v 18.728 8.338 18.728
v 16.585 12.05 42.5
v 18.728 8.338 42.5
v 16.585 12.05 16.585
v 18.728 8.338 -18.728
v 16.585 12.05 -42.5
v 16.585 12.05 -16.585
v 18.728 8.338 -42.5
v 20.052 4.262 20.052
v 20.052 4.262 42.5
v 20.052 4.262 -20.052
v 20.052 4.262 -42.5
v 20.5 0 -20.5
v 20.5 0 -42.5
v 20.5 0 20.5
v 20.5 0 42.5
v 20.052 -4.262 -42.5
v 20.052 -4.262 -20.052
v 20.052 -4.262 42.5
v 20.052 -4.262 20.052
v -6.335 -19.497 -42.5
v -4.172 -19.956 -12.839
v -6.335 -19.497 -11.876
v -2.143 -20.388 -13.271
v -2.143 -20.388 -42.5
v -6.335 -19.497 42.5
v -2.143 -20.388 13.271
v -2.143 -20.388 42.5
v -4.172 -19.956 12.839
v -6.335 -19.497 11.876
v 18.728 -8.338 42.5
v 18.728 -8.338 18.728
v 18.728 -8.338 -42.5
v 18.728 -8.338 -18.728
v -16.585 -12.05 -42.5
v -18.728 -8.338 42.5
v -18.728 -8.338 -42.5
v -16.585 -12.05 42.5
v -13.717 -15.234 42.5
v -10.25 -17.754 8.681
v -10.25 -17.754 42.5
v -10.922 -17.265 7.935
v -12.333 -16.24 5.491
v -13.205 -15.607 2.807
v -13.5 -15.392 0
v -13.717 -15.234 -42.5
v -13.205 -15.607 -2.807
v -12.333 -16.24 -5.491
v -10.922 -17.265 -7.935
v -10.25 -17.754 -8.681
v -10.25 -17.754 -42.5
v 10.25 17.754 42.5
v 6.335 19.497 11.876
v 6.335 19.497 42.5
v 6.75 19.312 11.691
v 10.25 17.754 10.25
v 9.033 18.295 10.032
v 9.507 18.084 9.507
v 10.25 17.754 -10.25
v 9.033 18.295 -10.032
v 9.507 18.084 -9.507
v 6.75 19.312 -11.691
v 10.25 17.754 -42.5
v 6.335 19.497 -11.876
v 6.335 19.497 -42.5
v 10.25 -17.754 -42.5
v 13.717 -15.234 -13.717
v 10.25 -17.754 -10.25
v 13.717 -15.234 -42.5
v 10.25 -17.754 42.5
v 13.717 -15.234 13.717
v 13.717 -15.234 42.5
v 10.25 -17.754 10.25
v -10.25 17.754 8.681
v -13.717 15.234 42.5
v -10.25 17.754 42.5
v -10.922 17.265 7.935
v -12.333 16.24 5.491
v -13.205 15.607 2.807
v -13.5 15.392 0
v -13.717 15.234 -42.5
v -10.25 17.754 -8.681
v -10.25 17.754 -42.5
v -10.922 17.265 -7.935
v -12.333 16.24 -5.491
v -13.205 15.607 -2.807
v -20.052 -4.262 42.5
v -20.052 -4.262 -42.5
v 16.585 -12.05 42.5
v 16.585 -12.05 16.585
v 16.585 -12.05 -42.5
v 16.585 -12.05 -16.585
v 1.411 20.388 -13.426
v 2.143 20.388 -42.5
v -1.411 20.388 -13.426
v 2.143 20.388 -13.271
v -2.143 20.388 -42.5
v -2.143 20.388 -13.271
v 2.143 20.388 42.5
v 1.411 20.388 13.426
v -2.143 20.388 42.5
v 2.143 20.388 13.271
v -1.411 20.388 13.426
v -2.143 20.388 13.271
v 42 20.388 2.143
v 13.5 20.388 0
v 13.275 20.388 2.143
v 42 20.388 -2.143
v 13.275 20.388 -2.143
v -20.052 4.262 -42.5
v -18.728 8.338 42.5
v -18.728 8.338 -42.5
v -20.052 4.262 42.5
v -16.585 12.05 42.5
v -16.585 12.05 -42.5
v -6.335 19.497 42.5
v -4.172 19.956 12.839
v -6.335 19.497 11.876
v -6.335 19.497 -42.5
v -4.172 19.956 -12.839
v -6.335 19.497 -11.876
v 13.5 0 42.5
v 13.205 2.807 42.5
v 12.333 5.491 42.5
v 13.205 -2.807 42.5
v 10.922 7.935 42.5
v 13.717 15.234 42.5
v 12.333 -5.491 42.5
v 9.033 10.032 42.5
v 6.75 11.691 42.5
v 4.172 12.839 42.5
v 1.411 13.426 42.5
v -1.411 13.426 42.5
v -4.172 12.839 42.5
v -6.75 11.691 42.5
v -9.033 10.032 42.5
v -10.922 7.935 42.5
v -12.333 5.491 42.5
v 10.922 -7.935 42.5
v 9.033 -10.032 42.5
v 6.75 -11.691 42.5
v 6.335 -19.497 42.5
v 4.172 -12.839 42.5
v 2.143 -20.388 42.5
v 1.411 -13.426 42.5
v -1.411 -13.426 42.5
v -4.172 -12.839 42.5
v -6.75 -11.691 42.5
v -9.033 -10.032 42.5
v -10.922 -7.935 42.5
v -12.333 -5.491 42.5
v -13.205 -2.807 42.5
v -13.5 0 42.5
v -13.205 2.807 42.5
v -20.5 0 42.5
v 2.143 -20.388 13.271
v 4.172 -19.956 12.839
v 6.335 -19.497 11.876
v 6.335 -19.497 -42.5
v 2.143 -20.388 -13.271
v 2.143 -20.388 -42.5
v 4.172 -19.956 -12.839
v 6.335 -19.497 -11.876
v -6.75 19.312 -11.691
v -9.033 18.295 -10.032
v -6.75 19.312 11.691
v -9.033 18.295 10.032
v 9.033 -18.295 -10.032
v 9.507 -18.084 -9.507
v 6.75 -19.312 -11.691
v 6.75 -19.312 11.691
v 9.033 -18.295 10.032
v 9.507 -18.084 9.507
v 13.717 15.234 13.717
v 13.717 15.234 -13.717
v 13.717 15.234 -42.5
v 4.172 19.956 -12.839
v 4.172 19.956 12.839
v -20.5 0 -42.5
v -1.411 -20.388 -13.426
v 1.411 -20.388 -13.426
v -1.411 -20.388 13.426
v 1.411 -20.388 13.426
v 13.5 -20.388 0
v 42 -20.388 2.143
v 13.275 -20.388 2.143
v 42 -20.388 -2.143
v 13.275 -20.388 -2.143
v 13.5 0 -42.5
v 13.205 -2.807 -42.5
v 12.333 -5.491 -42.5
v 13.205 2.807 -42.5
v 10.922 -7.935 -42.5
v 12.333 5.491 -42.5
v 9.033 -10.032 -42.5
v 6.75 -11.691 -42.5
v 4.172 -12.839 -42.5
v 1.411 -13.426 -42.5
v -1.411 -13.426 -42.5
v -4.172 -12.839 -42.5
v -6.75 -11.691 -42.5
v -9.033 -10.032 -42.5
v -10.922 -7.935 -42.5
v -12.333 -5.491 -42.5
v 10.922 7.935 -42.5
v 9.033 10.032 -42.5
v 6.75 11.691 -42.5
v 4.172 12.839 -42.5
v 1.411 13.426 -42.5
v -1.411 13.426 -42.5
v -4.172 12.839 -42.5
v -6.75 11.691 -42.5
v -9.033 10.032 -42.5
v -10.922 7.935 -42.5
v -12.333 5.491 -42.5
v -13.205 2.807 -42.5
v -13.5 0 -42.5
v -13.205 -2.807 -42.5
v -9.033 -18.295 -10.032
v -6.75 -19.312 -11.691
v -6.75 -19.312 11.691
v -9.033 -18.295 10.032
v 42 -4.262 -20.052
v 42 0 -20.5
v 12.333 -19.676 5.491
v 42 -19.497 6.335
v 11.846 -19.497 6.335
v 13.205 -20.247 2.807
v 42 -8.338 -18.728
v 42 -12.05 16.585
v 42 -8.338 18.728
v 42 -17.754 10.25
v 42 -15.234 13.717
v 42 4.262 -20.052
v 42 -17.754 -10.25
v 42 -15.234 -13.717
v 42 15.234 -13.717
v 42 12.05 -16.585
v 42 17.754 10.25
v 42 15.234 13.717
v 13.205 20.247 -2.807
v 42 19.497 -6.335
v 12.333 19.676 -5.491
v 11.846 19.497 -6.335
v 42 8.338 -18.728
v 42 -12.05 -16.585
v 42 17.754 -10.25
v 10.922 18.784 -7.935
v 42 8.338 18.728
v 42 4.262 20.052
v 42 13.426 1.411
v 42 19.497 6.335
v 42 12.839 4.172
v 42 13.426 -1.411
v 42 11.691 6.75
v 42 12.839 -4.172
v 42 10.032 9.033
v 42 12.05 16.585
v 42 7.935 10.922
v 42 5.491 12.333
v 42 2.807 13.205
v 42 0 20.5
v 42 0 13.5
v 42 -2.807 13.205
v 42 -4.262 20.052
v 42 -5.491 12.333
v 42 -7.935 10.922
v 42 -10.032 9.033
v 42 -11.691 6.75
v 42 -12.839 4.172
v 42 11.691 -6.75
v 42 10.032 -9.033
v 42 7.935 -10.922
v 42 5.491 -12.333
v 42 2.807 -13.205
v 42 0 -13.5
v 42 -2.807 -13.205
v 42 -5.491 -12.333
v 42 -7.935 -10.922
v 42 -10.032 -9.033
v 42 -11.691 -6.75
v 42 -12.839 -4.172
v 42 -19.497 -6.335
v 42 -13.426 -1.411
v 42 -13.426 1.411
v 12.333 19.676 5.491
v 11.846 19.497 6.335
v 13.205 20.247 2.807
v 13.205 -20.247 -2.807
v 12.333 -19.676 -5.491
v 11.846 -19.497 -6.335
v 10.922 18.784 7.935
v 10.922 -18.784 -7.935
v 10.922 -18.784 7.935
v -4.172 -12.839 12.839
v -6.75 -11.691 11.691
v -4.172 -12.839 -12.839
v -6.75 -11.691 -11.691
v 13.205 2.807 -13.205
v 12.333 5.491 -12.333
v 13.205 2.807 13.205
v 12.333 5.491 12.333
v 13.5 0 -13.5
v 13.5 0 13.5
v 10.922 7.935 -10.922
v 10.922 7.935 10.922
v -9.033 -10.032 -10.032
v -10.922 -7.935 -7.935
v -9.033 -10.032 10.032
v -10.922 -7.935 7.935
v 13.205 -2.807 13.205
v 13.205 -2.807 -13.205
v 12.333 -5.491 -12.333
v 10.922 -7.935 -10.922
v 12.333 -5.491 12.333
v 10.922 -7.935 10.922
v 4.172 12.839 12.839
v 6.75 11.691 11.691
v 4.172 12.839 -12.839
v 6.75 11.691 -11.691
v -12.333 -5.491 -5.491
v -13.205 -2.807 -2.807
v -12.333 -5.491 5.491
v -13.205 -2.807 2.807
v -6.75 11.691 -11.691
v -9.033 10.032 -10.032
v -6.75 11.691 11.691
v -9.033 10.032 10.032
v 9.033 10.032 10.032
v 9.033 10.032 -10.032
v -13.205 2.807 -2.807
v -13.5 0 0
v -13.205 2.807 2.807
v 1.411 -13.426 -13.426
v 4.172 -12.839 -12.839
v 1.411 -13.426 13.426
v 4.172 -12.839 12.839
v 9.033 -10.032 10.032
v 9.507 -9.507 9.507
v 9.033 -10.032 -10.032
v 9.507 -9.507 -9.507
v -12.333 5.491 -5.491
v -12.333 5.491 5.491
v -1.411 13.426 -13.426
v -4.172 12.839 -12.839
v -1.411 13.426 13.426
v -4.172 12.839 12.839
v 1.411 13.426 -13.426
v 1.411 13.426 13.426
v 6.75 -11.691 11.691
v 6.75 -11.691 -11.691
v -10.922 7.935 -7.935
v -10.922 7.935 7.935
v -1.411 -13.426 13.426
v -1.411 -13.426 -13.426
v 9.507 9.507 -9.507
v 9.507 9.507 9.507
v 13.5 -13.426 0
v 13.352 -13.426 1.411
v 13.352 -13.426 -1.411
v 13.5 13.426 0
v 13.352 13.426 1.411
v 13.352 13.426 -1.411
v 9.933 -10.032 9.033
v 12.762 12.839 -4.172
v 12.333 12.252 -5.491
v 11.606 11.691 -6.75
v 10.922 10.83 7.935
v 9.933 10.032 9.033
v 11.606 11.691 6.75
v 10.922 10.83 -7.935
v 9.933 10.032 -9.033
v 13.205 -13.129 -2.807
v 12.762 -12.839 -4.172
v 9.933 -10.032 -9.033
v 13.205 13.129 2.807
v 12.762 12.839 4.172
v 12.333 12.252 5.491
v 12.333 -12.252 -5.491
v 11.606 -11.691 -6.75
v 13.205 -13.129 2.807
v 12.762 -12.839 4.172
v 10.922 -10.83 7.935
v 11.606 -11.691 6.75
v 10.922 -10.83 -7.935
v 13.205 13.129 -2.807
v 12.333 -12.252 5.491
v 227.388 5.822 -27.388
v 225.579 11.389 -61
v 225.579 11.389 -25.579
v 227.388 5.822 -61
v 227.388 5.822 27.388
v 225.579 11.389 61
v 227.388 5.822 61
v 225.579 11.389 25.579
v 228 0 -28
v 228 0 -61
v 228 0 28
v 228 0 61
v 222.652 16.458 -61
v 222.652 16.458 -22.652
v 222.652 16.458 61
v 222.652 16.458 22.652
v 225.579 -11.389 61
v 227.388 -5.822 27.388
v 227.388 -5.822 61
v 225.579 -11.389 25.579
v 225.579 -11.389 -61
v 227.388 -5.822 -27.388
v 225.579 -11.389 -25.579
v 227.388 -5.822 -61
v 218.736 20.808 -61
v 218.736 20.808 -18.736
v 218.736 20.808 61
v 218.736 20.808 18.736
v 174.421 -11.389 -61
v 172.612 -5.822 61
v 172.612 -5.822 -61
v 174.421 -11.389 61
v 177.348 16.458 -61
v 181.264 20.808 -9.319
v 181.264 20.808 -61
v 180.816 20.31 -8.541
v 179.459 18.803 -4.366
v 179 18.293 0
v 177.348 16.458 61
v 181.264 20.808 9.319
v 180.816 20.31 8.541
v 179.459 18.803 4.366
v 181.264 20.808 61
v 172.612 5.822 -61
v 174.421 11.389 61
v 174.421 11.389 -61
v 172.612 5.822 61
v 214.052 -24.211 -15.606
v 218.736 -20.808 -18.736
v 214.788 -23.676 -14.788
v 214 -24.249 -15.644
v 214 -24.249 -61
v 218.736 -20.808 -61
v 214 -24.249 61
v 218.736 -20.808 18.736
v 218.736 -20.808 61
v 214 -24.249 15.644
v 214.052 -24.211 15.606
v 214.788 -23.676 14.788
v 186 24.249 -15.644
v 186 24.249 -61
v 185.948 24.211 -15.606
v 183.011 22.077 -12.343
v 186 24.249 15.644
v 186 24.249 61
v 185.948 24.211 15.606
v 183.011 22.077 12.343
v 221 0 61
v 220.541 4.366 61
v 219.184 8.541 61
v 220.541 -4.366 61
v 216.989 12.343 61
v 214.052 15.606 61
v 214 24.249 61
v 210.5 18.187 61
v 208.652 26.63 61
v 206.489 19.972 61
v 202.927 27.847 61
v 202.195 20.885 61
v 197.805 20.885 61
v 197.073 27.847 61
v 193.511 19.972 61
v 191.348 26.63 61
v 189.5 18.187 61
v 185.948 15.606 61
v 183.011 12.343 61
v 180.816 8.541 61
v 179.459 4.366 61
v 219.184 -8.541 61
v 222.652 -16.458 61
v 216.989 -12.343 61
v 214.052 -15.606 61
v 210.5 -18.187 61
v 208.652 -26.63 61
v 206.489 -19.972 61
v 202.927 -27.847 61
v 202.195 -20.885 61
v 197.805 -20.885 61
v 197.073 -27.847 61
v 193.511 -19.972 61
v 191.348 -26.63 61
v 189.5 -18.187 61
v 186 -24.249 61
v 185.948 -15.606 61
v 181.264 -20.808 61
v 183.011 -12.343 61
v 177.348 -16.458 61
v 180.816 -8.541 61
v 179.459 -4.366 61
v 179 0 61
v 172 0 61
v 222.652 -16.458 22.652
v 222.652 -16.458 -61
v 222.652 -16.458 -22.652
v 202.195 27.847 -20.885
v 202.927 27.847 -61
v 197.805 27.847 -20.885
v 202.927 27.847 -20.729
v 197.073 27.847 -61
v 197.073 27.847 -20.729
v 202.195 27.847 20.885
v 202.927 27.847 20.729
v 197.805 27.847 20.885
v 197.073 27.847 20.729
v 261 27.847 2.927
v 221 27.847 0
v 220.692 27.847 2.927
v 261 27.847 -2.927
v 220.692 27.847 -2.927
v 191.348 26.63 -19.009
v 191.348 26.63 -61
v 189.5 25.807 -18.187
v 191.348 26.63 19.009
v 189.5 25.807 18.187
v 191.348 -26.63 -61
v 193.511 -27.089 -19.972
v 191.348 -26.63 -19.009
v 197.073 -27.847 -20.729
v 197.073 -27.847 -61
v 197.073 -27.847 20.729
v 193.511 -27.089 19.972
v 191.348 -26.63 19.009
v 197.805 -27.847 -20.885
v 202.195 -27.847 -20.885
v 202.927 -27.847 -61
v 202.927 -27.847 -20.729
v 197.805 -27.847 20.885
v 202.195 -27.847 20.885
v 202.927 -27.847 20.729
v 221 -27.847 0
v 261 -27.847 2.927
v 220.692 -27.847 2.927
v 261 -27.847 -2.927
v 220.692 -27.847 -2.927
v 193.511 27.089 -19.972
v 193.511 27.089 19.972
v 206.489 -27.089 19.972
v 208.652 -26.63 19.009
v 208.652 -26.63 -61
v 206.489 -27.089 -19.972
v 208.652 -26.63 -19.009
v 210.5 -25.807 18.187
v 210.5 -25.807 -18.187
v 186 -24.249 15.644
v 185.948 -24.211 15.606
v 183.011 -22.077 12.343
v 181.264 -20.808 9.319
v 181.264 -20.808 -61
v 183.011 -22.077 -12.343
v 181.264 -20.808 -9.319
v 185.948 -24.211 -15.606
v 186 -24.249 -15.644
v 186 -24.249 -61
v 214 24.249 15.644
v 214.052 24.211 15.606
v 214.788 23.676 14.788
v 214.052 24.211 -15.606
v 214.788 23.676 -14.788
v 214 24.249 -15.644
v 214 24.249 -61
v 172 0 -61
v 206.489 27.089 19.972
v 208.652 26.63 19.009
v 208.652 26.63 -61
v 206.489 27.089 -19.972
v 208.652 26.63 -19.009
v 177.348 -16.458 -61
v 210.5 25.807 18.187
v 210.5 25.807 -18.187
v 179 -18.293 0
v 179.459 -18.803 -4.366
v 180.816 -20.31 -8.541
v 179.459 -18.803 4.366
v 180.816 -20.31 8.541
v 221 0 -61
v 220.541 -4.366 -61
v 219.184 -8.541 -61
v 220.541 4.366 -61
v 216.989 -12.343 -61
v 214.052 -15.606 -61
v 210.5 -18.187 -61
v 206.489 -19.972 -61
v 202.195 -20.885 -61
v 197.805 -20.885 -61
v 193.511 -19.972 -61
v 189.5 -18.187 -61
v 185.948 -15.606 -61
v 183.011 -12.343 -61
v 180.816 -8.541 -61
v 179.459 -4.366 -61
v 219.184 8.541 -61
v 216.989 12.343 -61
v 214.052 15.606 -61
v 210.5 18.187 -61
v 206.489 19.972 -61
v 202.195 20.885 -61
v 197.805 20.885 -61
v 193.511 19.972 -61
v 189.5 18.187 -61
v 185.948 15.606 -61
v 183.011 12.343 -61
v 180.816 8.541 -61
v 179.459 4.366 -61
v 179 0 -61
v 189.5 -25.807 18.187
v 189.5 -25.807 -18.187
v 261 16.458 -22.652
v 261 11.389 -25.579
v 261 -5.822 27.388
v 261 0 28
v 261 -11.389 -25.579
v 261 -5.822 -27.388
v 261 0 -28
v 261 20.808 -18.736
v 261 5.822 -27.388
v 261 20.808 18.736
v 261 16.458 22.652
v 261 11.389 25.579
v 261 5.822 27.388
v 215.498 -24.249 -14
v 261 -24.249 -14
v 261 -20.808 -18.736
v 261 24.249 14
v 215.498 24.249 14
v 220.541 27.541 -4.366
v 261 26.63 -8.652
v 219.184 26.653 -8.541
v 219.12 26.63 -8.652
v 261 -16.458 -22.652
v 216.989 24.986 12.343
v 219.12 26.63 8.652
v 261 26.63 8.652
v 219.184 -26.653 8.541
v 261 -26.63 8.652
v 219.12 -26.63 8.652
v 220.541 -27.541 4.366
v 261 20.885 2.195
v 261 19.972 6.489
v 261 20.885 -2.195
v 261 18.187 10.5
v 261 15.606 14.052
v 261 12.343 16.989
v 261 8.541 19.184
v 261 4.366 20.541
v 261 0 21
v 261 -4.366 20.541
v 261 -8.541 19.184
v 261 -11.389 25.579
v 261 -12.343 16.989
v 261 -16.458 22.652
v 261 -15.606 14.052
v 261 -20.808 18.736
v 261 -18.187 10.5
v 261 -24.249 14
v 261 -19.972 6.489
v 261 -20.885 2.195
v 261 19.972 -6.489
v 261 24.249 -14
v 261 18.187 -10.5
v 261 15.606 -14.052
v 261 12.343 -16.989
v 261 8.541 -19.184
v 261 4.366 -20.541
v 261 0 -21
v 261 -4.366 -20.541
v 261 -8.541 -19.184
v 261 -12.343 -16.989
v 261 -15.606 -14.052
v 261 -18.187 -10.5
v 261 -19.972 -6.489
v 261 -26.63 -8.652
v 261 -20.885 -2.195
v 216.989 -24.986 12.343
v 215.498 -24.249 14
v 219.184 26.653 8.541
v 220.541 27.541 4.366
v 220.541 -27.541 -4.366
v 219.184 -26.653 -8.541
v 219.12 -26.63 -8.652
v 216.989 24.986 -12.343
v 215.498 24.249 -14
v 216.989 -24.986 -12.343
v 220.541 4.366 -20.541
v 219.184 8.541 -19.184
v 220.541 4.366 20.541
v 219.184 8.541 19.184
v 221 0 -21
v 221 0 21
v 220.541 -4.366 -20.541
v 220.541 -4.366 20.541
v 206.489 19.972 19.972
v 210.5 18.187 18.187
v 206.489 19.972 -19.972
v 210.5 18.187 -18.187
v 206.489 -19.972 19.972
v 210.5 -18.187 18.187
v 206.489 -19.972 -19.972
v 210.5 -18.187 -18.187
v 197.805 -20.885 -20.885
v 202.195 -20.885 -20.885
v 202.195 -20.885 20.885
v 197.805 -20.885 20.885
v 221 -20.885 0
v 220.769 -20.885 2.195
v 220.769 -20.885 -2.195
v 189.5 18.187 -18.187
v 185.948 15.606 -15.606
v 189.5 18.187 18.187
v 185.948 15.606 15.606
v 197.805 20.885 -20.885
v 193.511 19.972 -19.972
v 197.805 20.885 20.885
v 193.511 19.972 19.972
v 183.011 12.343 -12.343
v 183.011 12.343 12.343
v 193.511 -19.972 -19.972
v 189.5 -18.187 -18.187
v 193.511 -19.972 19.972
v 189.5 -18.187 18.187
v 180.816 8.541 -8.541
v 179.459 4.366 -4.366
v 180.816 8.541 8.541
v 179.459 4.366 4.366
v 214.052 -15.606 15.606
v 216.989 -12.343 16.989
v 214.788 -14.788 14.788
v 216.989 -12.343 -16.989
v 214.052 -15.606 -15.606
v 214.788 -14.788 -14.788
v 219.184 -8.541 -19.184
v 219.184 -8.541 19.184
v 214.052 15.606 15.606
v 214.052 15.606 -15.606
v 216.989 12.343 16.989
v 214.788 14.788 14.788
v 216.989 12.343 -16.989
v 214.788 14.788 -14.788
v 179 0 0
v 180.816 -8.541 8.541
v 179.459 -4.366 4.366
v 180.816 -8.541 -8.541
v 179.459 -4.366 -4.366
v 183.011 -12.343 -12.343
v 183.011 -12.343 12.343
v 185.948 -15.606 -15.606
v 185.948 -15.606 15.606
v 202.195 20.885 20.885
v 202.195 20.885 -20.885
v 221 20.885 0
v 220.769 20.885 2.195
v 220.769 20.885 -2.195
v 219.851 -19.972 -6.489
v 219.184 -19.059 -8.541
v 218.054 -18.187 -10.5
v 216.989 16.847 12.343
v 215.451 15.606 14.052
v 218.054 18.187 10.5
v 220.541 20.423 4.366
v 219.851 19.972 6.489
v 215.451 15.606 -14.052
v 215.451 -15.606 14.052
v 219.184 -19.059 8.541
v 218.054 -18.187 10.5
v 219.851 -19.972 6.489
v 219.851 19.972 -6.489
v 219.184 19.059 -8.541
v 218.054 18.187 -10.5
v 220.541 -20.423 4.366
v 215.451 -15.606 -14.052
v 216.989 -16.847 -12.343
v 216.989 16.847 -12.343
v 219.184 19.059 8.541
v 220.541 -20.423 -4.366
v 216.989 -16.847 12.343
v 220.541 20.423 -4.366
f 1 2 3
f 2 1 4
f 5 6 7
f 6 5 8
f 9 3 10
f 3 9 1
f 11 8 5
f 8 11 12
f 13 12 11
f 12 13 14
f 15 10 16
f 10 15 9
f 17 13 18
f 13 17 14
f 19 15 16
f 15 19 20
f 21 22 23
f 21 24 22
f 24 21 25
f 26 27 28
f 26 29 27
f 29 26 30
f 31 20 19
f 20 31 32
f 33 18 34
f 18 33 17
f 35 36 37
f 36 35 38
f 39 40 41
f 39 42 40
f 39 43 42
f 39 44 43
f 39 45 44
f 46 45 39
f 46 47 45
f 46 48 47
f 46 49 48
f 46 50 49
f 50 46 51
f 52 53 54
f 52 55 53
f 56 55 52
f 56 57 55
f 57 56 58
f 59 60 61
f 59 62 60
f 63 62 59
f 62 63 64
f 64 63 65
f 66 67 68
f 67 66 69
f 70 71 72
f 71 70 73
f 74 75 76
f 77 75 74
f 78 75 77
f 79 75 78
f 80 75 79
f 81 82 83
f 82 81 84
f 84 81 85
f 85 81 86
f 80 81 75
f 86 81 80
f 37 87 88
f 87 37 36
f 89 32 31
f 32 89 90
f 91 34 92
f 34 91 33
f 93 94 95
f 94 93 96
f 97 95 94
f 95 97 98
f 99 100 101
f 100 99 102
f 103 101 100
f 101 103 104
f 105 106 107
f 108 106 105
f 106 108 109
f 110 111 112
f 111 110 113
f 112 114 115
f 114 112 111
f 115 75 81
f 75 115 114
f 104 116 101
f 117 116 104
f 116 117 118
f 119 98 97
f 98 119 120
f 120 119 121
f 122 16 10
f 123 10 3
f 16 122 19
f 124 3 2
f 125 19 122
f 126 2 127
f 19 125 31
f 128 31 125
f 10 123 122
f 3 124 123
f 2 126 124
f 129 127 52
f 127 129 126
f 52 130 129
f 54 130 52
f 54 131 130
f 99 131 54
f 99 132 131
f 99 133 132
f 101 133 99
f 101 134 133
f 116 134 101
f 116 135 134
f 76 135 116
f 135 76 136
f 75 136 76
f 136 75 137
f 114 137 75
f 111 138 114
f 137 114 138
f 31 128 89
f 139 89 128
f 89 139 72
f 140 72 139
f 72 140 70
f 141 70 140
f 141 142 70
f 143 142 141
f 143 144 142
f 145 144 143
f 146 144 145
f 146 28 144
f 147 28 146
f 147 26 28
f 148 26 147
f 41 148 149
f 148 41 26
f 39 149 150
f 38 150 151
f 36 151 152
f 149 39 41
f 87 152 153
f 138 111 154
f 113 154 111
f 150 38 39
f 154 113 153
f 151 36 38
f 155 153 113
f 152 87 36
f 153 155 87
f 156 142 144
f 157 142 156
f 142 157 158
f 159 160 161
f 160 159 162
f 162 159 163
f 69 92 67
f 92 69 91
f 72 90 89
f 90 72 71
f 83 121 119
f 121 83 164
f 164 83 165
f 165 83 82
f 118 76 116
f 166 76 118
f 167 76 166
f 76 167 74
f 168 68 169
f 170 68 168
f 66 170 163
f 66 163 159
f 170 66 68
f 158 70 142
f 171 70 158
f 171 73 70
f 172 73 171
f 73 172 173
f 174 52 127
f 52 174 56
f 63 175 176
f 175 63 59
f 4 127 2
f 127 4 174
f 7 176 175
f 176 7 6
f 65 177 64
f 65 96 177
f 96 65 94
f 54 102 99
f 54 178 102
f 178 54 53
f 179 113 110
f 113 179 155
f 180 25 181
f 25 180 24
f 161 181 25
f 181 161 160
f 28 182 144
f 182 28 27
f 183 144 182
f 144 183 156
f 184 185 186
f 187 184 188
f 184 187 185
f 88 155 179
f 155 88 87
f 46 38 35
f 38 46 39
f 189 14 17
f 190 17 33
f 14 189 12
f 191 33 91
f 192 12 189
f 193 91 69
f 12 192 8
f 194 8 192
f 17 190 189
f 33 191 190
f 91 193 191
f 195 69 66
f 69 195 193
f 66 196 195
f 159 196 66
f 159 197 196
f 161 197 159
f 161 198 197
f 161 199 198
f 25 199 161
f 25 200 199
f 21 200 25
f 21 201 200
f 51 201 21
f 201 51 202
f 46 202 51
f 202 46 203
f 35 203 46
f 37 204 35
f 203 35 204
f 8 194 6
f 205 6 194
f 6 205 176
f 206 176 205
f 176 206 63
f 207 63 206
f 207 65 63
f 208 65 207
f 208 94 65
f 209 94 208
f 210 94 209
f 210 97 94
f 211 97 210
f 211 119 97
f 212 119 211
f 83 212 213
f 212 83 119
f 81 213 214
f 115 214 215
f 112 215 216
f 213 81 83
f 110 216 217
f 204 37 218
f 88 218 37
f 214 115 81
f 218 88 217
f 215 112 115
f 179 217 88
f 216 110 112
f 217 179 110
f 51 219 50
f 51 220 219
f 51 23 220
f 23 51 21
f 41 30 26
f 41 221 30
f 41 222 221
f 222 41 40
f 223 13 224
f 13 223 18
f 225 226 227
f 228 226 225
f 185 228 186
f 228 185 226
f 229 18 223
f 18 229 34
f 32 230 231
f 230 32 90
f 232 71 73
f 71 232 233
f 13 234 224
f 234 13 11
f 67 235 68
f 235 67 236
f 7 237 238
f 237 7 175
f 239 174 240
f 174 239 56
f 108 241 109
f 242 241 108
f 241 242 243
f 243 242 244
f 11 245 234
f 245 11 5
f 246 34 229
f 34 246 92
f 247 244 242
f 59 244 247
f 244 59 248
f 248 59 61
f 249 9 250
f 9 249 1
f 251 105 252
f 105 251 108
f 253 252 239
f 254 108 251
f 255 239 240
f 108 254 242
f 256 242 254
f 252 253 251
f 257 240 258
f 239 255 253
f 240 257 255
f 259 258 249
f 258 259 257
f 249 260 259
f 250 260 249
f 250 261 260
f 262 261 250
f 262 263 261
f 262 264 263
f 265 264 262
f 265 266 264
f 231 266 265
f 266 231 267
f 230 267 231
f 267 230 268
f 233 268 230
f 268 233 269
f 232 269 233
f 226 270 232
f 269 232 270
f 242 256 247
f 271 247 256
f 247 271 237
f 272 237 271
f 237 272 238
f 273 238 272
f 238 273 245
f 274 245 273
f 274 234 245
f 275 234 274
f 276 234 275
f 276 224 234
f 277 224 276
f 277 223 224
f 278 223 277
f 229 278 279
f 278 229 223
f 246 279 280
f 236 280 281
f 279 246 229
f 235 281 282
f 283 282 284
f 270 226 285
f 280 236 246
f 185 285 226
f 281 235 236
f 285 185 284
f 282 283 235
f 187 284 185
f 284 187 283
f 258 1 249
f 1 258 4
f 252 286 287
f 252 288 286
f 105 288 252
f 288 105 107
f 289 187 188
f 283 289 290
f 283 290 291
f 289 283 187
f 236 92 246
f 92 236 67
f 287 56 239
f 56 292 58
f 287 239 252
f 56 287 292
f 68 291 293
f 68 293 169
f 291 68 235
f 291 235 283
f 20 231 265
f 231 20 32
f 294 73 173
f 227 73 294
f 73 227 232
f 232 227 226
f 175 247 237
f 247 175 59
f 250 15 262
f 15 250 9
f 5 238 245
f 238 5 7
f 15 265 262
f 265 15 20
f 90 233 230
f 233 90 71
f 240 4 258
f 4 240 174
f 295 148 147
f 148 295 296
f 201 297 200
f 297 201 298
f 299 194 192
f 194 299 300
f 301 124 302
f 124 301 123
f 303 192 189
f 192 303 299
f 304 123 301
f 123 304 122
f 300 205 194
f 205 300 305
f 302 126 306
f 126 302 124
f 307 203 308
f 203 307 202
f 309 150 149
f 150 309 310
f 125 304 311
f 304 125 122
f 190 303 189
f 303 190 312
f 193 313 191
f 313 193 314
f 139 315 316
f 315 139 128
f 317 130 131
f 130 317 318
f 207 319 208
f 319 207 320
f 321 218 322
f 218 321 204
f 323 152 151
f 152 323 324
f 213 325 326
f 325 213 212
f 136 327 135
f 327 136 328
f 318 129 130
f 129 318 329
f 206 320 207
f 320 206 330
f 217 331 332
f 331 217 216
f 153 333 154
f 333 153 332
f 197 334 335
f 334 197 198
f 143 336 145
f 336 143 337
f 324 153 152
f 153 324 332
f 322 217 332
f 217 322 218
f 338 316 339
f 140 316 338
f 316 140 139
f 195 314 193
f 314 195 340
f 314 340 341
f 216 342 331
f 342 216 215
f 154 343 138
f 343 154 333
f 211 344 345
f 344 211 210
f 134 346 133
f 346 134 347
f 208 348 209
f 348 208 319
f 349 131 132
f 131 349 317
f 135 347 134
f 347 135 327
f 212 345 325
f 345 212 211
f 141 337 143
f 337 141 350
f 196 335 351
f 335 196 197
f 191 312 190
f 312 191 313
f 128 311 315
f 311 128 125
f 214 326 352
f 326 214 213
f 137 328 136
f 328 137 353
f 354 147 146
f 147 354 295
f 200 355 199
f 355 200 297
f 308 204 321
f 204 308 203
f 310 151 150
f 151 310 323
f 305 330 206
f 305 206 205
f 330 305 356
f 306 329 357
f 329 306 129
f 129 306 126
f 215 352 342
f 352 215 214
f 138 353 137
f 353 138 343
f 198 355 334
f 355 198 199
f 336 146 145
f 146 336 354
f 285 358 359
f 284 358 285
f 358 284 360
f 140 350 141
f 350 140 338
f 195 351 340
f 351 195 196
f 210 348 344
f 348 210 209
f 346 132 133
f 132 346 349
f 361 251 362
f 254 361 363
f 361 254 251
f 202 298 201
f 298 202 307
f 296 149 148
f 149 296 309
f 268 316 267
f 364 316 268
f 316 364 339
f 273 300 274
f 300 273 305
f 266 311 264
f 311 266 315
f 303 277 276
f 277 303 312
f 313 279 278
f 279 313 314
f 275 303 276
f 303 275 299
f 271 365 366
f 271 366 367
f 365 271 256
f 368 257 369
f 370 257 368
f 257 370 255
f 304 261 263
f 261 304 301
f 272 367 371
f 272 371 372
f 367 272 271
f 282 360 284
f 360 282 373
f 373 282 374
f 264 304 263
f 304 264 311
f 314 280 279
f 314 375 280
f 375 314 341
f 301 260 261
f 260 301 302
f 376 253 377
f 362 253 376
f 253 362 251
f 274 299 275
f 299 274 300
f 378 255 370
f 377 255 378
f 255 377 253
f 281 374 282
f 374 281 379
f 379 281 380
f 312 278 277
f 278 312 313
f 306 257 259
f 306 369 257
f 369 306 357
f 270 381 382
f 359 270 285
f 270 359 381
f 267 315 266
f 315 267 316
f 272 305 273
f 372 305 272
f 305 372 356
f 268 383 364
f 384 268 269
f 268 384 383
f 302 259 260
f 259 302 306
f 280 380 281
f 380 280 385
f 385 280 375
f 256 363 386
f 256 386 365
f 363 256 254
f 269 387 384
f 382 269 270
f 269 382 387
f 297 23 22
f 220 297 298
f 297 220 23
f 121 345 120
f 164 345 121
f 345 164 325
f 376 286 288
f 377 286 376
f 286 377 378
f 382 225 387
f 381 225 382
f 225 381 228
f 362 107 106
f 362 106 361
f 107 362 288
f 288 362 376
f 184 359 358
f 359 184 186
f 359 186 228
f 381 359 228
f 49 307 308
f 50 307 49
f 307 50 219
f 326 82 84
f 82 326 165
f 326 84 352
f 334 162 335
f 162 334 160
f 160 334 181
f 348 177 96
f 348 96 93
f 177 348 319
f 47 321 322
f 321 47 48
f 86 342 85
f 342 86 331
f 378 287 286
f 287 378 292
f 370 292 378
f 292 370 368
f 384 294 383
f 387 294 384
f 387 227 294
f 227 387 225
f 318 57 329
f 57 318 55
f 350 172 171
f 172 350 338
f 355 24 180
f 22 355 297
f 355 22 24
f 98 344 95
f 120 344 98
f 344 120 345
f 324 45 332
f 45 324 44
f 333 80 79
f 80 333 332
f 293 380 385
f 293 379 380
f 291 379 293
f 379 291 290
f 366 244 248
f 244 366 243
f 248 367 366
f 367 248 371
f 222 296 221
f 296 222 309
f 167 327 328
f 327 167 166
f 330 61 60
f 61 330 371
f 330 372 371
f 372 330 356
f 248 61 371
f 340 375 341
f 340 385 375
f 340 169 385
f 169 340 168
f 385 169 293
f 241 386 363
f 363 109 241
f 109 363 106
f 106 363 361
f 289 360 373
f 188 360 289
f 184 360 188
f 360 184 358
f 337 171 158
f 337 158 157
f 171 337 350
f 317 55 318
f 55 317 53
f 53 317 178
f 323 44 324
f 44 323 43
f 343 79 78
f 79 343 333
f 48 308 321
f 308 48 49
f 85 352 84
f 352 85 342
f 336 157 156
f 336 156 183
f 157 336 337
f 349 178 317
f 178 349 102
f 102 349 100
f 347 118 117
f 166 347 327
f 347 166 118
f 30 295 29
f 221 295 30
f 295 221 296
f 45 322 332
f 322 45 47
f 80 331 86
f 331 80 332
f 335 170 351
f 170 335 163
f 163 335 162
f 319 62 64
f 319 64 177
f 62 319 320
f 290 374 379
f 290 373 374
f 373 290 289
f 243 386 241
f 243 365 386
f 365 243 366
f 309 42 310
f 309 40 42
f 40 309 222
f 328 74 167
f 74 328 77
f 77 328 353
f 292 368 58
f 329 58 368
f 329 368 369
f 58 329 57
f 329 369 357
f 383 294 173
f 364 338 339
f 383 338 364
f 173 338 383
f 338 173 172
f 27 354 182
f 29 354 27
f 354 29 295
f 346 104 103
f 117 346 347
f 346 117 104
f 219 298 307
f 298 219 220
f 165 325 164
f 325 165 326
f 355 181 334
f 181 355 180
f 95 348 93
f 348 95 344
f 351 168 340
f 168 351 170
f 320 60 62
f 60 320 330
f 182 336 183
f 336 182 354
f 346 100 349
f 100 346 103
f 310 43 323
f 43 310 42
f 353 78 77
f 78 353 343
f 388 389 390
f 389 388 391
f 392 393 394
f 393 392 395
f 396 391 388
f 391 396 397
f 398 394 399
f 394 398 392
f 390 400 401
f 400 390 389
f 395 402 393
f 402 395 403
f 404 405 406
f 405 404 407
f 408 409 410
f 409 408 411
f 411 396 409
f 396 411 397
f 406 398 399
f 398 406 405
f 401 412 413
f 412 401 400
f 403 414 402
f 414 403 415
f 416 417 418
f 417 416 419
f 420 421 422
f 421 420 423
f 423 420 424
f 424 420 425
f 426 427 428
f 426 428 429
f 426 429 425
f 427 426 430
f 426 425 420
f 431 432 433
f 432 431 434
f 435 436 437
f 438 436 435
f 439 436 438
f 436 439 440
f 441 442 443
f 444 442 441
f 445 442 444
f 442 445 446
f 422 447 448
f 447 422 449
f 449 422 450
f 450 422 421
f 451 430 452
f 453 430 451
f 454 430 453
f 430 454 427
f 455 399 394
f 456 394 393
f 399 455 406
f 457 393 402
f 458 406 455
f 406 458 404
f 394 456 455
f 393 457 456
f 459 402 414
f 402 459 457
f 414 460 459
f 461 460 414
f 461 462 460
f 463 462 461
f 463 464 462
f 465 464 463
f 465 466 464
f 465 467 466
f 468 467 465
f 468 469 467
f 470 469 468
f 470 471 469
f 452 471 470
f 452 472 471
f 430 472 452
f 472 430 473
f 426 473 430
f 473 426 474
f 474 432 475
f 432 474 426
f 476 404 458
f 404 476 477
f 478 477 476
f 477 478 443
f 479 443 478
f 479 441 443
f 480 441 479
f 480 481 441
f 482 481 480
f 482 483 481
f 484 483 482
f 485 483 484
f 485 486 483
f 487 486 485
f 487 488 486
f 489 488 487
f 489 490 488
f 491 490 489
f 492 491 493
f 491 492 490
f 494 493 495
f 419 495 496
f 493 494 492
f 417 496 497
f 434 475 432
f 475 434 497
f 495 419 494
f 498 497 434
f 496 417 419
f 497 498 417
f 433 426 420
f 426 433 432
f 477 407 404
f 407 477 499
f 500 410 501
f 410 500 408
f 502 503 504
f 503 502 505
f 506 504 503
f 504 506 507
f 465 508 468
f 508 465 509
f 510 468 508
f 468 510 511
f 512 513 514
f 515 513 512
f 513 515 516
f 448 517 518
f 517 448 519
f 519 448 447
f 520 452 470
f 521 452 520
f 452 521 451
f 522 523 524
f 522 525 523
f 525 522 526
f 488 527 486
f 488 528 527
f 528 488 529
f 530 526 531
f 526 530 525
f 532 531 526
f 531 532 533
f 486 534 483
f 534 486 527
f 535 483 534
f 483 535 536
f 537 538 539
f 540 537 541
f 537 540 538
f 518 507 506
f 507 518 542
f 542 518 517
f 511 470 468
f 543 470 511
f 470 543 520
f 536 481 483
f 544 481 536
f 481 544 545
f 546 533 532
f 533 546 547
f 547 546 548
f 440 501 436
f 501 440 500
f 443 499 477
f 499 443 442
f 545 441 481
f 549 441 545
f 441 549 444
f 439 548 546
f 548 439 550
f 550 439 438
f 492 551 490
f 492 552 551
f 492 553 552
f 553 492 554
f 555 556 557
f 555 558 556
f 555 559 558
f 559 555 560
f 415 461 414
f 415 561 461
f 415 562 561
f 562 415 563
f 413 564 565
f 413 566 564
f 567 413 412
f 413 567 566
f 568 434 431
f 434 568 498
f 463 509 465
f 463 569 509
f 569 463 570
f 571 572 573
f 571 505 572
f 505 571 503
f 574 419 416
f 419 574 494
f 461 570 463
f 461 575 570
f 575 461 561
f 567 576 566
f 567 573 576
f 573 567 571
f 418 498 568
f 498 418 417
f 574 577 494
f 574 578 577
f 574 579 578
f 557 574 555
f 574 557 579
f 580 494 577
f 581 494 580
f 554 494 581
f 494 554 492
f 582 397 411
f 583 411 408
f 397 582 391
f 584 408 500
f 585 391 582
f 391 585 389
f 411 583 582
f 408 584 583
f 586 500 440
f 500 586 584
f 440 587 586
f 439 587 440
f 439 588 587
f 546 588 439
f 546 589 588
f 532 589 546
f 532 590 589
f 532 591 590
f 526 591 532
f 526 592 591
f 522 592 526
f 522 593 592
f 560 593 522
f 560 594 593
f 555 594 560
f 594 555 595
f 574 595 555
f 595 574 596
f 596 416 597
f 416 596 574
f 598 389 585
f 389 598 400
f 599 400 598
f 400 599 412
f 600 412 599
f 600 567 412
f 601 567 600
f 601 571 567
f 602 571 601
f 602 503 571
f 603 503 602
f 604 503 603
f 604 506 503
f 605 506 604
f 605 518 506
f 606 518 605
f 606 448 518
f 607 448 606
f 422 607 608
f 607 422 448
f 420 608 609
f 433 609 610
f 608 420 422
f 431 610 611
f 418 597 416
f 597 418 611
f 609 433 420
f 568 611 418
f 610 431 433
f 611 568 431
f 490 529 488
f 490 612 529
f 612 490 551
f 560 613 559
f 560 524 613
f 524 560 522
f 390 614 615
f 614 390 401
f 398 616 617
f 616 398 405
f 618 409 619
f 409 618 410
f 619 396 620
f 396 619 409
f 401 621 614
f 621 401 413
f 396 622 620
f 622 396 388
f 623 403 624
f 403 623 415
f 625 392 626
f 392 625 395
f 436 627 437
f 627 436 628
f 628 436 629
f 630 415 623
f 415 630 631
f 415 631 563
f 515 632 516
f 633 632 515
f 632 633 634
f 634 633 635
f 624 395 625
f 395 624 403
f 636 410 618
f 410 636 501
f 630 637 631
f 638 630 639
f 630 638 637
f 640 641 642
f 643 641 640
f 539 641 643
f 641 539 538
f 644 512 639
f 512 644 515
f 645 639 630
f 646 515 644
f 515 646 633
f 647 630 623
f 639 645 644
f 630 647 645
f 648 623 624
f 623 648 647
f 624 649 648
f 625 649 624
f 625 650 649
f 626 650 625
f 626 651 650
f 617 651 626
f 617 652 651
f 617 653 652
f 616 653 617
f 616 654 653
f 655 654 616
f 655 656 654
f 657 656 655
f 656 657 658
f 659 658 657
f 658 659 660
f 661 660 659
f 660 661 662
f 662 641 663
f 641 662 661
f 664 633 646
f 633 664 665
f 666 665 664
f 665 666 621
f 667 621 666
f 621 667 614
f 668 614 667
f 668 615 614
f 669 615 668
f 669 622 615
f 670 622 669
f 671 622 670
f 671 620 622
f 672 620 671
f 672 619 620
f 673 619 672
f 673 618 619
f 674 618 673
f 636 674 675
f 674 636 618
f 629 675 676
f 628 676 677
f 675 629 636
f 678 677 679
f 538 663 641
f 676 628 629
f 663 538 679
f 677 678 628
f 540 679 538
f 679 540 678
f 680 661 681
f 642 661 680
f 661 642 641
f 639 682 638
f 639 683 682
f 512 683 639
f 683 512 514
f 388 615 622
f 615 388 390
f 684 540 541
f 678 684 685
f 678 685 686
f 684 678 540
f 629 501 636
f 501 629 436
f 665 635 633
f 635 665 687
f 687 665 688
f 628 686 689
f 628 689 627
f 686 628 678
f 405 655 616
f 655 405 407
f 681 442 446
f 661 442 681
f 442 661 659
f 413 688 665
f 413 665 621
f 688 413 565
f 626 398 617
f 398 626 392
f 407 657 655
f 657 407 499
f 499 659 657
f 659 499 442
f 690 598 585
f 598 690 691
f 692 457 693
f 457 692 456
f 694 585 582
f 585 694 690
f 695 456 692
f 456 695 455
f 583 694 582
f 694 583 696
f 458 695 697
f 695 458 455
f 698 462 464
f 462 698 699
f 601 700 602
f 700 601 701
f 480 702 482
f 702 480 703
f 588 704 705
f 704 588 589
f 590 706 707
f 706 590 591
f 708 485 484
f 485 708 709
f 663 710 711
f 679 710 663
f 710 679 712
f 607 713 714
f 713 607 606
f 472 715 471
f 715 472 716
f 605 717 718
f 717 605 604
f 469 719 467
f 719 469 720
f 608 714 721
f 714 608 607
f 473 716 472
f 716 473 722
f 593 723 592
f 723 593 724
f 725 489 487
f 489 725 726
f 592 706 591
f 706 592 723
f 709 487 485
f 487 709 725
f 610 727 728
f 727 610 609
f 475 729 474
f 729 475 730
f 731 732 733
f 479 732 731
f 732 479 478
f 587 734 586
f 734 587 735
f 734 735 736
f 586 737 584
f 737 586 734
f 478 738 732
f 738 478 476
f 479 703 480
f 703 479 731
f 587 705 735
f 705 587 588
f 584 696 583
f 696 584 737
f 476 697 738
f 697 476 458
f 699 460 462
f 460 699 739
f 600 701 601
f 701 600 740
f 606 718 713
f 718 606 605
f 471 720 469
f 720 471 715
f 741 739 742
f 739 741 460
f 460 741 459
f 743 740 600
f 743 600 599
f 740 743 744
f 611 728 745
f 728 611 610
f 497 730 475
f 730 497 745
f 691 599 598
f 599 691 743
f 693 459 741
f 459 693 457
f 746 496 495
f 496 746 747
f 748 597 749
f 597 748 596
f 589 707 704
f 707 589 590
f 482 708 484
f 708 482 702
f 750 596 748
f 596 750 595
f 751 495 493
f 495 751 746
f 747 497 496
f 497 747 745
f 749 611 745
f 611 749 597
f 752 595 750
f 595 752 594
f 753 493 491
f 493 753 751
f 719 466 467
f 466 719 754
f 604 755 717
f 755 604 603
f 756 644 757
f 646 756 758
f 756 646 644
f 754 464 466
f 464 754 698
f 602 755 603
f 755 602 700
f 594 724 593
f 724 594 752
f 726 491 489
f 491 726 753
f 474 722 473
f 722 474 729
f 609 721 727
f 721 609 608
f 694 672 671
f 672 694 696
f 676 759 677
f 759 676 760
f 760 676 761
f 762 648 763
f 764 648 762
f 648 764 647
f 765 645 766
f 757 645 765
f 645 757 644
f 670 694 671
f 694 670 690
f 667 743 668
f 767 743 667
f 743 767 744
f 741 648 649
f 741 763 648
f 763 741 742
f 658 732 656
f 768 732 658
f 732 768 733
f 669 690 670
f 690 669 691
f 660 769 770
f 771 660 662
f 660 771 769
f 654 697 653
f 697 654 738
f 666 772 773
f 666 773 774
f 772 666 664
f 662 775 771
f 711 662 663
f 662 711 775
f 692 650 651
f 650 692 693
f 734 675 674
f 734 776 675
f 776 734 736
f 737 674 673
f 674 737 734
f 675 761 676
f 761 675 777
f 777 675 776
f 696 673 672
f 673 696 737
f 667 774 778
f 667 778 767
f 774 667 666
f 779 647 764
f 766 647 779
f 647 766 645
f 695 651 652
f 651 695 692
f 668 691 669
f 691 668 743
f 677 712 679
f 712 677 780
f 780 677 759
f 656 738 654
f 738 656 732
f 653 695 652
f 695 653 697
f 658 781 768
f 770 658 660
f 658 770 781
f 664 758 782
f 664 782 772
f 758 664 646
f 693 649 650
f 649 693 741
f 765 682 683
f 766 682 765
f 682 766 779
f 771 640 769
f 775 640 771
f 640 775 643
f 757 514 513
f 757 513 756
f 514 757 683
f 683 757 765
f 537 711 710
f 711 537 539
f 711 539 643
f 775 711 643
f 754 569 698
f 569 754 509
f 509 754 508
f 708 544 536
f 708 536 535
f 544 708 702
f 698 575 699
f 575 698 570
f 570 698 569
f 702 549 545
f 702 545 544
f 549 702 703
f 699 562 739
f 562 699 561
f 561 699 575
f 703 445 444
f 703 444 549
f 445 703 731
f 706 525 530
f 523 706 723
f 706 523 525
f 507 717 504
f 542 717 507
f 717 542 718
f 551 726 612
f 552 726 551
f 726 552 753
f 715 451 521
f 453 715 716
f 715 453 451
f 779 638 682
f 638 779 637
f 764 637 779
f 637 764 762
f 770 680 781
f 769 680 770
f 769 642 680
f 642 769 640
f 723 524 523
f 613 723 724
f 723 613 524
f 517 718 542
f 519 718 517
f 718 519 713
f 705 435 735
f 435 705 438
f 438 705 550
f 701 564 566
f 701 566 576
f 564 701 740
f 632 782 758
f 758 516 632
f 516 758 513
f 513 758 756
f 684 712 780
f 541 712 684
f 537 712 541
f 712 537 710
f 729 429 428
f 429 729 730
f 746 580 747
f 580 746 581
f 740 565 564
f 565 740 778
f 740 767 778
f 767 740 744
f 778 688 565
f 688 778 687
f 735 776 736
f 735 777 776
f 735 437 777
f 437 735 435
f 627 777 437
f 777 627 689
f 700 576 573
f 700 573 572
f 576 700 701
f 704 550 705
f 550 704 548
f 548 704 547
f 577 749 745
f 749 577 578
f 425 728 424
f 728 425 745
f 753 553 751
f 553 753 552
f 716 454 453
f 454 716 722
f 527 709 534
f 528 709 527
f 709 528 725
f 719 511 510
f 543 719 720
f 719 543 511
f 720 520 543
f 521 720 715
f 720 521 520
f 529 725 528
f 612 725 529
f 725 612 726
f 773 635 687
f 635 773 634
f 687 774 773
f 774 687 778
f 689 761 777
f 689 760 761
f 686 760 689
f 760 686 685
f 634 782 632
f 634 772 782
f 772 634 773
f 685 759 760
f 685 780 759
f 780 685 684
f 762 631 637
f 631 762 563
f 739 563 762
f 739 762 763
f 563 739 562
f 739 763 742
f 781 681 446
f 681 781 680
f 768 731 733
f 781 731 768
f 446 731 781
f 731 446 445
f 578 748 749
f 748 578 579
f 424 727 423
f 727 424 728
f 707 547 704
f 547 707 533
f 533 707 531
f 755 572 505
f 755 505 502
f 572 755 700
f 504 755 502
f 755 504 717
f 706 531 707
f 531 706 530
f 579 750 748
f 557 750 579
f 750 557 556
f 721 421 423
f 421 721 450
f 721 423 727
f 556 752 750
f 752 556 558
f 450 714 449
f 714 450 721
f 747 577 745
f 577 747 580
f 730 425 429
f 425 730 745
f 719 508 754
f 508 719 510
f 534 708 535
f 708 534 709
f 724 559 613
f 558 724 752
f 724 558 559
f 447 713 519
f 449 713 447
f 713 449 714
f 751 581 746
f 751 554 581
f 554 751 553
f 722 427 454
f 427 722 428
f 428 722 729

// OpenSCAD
// file: tube_clamp_square_base_plate_132_functions.scad
function get_L_shaft_with_base_plate_square_base_plate_132(beam_width) = 
    // (beam_width == 40) ?
    75
;
function get_R_plate_square_base_plate_132(beam_width) = 
    // (beam_width == 40) ?
    [143, 75, 18.5]
;
function get_thickness_square_base_plate_132(beam_width) = 
    // (beam_width == 40) ?
    8
;
function get_offset_hole_x_square_base_plate_132(beam_width) = 
    // (beam_width == 40) ?
    100 / 2
;
function get_diameter_hole_square_base_plate_132(beam_width) = 
    // (beam_width == 40) ?
    10
;
// file: tube_clamp_round_base_plate_132_functions.scad
function get_L_shaft_with_base_plate_round_base_plate_132(tube_diameter) = 
    (tube_diameter == 27) ? 
        85
    : (tube_diameter == 42) ?
        122
    : 25
;
function get_R_plate_round_base_plate_132(tube_diameter) = 
    (tube_diameter == 27) ? 
        [64, 114, 7]
    : (tube_diameter == 42) ?
        [80, 140, 10]
    : [10, 20, 1]
;
function get_offset_hole_y_round_base_plate_132(tube_diameter) = 
    (tube_diameter == 27) ? 
        38
    : (tube_diameter == 42) ?
        50
    : 10
;
function get_diameter_hole_round_base_plate_132(tube_diameter) = 10;
// file: tube_clamp_round_3_way_through_116_functions.scad
function  get_L_shaft_long_round_3_way_through_116(tube_diameter) = 
    (tube_diameter == 27) ? 
        42
    : (tube_diameter == 42) ?
        60
    : 25
;
function get_thickness_round_3_way_through_116(tube_diameter) = 7;
function get_L_shaft_short_round_3_way_through_116(tube_diameter) = tube_diameter + 2 * get_thickness_round_3_way_through_116();
// file: tube_clamp_round_tee_long_104_functions.scad
// include <../../config.scad>;

function get_L_shaft_long_round_tee_long_104(tube_diameter) = 
    (tube_diameter == 27) ? 
        85
    : (tube_diameter == 42) ?
        122
    : 25
;
function get_L_shaft_short_round_tee_long_104(tube_diameter) = 
    (tube_diameter == 27) ? 
        42
    : (tube_diameter == 42) ?
        61
    : 10
;
// file: ../brake/brake_assembly_functions.scad
// include <../../config.scad>; // circular reference!

function get_y_pos_lead_fixing_ballscrew_to_brake_arms(angle_brake_rod, y_pos_axle_rear, x_pos_axle_leg_rear, x_offset_fixing_brake_arm_to_lead_plate) = y_pos_axle_rear - (x_pos_axle_leg_rear - x_offset_fixing_brake_arm_to_lead_plate) / tan(angle_brake_rod); // (X_POS_AXLE_LEG_REAR - X_OFFSET_FIXING_BRAKE_ARM_TO_LEAD_PLATE)
// file: ../common/metric_bolt_functions.scad
function get_metric_bolt_head_height(size) = size;
function get_metric_bolt_head_diameter(size) = size * 2;
function get_metric_bolt_washer_diameter_safe_working_clearance(size) = 
    (size < 20) ?
        4 * size
    :
        3 * size
;
// main file
include <../../config.scad>;

function  get_L_shaft_long_round_3_way_outlet_tee_176(tube_diameter) = 
    (tube_diameter == 27) ? 
        85
    : (tube_diameter == 42) ?
        122
    : 25
;
function get_L_shaft_short_round_3_way_outlet_tee_176(tube_diameter) = 
    (tube_diameter == 27) ? 
        42
    : (tube_diameter == 42) ?
        61
    : 10
;

module tube_clamp_round_3_way_outlet_tee_176(tube_diameter) {
    t = 7;
    L_shaft_long = get_L_shaft_long_round_3_way_outlet_tee_176(tube_diameter);
    L_shaft_short = get_L_shaft_short_round_3_way_outlet_tee_176(tube_diameter);
    color("LightGrey") difference() {
        union() {
            // long edge
            cylinder(L_shaft_long, tube_diameter / 2 + t, tube_diameter / 2 + t, center = true);
            // short perpendicular section
            translate([L_shaft_short / 2, 0, 0]) rotate([0, 90, 0]) cylinder(L_shaft_short, tube_diameter / 2 + t, tube_diameter / 2 + t, center = true);
        }
        cylinder(L_shaft_long, tube_diameter / 2, tube_diameter / 2, center = true);
        translate([L_shaft_short / 2, 0, 0]) rotate([0, 90, 0]) cylinder(L_shaft_short, tube_diameter / 2, tube_diameter / 2, center = true);
        rotate([90, 0, 0]) cylinder(L_shaft_long, tube_diameter / 2, tube_diameter / 2, center = true);
    }
    // Shopping
    echo(str("Round 3-way outlet tee 176: Tube clamp Φ", tube_diameter, "mm - x1"));
}

// test output
tube_clamp_round_3_way_outlet_tee_176(27);
translate([200, 0, 0]) tube_clamp_round_3_way_outlet_tee_176(42);
